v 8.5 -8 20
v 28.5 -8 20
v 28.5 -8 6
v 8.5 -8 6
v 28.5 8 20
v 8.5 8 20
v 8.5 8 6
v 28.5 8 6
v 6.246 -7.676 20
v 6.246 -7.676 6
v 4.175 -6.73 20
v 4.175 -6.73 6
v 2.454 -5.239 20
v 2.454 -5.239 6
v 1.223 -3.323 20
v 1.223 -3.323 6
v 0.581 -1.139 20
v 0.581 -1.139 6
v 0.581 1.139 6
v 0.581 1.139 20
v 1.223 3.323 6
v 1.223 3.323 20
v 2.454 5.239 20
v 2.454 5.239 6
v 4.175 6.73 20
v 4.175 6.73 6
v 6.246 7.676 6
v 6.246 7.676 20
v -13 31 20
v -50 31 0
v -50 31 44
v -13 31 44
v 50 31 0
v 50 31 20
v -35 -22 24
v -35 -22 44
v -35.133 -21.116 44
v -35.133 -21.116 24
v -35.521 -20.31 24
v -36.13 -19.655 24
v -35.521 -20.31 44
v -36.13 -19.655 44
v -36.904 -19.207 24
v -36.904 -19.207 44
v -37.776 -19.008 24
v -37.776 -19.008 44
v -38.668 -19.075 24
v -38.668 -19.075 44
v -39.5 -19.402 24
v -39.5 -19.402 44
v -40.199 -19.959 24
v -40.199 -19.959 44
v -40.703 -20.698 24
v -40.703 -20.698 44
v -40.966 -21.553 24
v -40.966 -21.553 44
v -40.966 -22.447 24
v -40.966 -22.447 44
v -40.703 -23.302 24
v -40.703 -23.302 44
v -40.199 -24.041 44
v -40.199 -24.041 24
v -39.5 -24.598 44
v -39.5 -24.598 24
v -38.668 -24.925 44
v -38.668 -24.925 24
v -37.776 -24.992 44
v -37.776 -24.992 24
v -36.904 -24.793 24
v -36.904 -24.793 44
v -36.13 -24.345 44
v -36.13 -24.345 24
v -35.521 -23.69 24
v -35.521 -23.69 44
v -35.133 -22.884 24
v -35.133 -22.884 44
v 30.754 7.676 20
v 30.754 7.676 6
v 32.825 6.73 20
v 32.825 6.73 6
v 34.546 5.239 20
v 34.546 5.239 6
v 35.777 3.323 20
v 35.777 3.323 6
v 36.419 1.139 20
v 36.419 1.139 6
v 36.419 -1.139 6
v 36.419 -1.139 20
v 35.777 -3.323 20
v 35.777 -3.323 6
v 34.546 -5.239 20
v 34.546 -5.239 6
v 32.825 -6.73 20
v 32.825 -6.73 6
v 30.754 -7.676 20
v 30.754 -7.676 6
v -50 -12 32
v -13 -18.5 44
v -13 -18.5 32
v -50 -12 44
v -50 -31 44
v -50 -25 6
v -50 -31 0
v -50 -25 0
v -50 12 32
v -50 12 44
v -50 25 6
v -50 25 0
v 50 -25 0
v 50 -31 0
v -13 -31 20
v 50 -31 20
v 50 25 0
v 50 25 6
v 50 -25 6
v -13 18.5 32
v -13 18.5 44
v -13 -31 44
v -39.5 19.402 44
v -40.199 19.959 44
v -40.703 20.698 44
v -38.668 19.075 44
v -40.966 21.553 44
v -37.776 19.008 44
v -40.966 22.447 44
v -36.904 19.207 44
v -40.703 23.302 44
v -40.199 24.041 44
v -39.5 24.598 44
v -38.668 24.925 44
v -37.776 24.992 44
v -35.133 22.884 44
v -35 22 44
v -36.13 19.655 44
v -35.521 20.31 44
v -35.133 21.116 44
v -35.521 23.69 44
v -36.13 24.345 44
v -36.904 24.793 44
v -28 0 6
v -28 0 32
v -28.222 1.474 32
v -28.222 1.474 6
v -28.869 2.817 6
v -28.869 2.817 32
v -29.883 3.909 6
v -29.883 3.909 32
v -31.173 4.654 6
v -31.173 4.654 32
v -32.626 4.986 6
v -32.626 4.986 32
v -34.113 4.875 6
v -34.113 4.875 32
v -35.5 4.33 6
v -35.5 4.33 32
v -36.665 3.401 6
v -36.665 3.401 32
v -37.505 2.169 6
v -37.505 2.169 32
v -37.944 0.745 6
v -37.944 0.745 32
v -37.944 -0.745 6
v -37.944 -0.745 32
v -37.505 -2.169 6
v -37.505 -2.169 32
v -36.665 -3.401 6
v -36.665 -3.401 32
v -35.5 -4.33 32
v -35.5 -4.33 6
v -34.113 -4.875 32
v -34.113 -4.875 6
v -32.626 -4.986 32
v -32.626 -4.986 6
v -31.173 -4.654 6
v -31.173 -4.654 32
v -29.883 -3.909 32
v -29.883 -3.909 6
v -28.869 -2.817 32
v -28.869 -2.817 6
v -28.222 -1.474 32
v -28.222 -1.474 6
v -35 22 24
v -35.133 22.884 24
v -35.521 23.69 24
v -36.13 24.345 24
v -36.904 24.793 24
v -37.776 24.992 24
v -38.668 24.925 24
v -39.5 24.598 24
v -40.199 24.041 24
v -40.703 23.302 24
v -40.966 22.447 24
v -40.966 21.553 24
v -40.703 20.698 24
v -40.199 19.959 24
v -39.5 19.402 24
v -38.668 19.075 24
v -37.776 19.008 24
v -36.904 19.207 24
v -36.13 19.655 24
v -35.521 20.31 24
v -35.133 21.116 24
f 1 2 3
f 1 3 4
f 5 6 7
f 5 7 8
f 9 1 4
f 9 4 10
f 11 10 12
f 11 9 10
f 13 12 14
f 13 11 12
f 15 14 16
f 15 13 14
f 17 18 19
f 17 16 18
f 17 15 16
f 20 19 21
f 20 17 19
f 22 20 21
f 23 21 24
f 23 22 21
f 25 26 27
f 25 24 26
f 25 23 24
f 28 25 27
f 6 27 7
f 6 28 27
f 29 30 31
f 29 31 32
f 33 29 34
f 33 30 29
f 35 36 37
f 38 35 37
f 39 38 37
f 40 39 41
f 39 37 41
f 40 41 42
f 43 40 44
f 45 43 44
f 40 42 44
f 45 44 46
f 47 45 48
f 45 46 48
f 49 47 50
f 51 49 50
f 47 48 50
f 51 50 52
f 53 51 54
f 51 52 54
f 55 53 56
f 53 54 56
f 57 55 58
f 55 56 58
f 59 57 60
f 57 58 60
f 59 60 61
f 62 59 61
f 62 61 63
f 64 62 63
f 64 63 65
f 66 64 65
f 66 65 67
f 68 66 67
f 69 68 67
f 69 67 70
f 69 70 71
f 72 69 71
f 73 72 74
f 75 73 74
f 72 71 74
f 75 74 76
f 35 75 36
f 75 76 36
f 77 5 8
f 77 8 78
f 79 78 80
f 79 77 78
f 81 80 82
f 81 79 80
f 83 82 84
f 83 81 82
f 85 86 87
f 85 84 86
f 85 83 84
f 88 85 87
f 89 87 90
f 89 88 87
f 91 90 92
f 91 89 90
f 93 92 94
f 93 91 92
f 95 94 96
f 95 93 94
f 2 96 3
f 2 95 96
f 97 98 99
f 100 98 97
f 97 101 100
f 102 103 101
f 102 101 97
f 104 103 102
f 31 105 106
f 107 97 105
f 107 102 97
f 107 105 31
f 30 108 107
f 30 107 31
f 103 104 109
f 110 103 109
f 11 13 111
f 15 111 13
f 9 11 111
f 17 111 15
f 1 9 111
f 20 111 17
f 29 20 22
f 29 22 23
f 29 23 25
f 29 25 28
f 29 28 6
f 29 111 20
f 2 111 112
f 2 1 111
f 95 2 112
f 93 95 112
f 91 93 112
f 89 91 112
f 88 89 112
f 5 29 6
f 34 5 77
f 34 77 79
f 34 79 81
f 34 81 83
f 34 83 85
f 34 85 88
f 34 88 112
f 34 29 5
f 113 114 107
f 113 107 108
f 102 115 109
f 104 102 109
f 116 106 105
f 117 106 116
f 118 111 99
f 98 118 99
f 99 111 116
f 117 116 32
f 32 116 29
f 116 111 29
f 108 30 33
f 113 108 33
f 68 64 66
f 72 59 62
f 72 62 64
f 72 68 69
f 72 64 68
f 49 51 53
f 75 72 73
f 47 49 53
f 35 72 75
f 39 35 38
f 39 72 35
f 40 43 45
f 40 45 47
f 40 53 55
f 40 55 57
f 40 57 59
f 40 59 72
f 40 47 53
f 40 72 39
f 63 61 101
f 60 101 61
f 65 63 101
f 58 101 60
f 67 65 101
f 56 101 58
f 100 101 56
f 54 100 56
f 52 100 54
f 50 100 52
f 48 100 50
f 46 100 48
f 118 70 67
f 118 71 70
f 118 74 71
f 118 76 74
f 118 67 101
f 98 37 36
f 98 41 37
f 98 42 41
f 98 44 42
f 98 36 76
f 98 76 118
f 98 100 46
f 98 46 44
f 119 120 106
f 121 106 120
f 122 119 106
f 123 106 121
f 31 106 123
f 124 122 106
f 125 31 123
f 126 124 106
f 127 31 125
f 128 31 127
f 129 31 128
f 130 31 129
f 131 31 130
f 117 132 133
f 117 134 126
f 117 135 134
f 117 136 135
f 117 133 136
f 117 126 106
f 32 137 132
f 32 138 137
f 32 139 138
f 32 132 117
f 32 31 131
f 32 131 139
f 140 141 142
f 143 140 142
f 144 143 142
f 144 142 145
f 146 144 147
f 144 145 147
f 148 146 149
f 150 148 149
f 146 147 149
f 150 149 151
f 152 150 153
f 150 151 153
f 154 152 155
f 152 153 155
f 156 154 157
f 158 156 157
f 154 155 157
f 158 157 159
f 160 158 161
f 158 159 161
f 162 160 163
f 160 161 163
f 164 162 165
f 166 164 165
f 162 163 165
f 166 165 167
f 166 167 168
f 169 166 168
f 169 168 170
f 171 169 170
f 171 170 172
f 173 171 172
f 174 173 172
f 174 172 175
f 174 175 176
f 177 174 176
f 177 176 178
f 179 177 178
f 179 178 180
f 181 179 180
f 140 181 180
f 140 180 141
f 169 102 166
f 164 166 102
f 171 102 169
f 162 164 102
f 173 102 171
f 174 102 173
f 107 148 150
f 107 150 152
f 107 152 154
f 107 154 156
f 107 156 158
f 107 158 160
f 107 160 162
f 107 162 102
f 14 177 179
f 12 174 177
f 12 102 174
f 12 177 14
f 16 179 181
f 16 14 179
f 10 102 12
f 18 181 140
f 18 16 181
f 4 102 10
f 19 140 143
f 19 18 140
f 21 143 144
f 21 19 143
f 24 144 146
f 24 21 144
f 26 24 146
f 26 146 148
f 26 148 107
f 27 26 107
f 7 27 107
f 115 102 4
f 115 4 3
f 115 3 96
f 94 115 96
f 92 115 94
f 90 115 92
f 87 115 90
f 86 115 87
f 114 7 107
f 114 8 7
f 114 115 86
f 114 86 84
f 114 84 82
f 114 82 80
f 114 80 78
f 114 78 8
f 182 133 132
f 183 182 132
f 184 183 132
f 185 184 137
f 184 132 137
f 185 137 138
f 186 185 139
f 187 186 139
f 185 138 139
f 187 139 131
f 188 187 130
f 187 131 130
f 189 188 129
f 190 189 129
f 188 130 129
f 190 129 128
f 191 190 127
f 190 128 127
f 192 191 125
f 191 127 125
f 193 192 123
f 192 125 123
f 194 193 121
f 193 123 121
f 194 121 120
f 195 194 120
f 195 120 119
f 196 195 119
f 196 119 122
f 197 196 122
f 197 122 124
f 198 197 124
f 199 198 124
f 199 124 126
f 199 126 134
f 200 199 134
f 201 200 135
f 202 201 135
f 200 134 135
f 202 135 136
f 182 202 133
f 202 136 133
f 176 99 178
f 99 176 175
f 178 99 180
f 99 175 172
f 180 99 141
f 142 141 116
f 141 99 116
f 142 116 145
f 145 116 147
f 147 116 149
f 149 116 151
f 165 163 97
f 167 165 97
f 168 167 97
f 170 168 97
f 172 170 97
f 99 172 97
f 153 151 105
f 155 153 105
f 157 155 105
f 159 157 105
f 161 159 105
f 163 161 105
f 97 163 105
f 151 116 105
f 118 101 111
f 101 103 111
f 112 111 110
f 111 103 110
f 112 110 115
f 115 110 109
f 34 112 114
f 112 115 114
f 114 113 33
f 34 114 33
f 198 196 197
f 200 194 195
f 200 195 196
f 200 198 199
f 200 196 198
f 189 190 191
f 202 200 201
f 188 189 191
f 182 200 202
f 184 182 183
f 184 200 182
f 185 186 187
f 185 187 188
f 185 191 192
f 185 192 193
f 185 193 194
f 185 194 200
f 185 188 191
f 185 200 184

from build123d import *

# Parameters (mm, degrees)
SKETCH1_W           = 100
SKETCH1_H           = 62
BOSS_EXTRUDE1_DEPTH = 20
SKETCH2_W           = 37
SKETCH2_H           = 62
BOSS_EXTRUDE2_DEPTH = 24
CUT_EXTRUDE2_DEPTH  = 12
SKETCH4_R           = 5
CUT_EXTRUDE3_DEPTH  = 33
SKETCH5_R           = 3
CUT_EXTRUDE4_DEPTH  = 20
SKETCH12_R          = 3
CUT_EXTRUDE12_DEPTH = 20
CUT_EXTRUDE13_DEPTH = 21
SKETCH14_W          = 6
SKETCH14_H          = 50
CUT_EXTRUDE14_DEPTH = 101


with BuildPart() as part:
    # Sketch1 → Boss-Extrude1 (new body)
    with BuildSketch(Plane.XY):
        Rectangle(SKETCH1_W, SKETCH1_H)
    extrude(amount=BOSS_EXTRUDE1_DEPTH)

    # Sketch2 → Boss-Extrude2 (add)
    with BuildSketch(Plane.XY.offset(20)):
        with Locations((-31.5, 0)):
            Rectangle(SKETCH2_W, SKETCH2_H)
    extrude(amount=BOSS_EXTRUDE2_DEPTH)

    # Sketch3 → Cut-Extrude2 (cut)
    with BuildSketch(Plane.XY.offset(44)):
        Polygon((-50, 12), (-13, 18.5), (-13, -18.5), (-50, -12), align=None)
    extrude(amount=-CUT_EXTRUDE2_DEPTH, mode=Mode.SUBTRACT)

    # Sketch4 → Cut-Extrude3 (cut, through all)
    with BuildSketch(Plane.XY.offset(32)):
        with Locations((-33, 0)):
            Circle(SKETCH4_R)
    extrude(amount=-CUT_EXTRUDE3_DEPTH, mode=Mode.SUBTRACT)

    # Sketch5 → Cut-Extrude4 (cut)
    with BuildSketch(Plane.XY.offset(44)):
        with Locations((-38, 22)):
            Circle(SKETCH5_R)
    extrude(amount=-CUT_EXTRUDE4_DEPTH, mode=Mode.SUBTRACT)

    # Sketch12 → Cut-Extrude12 (cut)
    with BuildSketch(Plane.XY.offset(44)):
        with Locations((-38, -22)):
            Circle(SKETCH12_R)
    extrude(amount=-CUT_EXTRUDE12_DEPTH, mode=Mode.SUBTRACT)

    # Sketch13 → Cut-Extrude13 (cut, through all)
    with BuildSketch(Plane.XY.offset(20)):
        with BuildLine():
            Line((8.5, 8), (28.5, 8))
            ThreePointArc((28.5, 8), (36.5, 0), (28.5, -8))
            Line((28.5, -8), (8.5, -8))
            ThreePointArc((8.5, -8), (0.5, 0), (8.5, 8))
        make_face()
    extrude(amount=-CUT_EXTRUDE13_DEPTH, mode=Mode.SUBTRACT)

    # Sketch14 → Cut-Extrude14 (cut, through all)
    with BuildSketch(Plane(origin=(50, 0, 0), x_dir=(0, 0, -1), z_dir=(1, 0, 0))):
        with Locations((-3, 0)):
            Rectangle(SKETCH14_W, SKETCH14_H)
    extrude(amount=-CUT_EXTRUDE14_DEPTH, mode=Mode.SUBTRACT)


solid = part.part
